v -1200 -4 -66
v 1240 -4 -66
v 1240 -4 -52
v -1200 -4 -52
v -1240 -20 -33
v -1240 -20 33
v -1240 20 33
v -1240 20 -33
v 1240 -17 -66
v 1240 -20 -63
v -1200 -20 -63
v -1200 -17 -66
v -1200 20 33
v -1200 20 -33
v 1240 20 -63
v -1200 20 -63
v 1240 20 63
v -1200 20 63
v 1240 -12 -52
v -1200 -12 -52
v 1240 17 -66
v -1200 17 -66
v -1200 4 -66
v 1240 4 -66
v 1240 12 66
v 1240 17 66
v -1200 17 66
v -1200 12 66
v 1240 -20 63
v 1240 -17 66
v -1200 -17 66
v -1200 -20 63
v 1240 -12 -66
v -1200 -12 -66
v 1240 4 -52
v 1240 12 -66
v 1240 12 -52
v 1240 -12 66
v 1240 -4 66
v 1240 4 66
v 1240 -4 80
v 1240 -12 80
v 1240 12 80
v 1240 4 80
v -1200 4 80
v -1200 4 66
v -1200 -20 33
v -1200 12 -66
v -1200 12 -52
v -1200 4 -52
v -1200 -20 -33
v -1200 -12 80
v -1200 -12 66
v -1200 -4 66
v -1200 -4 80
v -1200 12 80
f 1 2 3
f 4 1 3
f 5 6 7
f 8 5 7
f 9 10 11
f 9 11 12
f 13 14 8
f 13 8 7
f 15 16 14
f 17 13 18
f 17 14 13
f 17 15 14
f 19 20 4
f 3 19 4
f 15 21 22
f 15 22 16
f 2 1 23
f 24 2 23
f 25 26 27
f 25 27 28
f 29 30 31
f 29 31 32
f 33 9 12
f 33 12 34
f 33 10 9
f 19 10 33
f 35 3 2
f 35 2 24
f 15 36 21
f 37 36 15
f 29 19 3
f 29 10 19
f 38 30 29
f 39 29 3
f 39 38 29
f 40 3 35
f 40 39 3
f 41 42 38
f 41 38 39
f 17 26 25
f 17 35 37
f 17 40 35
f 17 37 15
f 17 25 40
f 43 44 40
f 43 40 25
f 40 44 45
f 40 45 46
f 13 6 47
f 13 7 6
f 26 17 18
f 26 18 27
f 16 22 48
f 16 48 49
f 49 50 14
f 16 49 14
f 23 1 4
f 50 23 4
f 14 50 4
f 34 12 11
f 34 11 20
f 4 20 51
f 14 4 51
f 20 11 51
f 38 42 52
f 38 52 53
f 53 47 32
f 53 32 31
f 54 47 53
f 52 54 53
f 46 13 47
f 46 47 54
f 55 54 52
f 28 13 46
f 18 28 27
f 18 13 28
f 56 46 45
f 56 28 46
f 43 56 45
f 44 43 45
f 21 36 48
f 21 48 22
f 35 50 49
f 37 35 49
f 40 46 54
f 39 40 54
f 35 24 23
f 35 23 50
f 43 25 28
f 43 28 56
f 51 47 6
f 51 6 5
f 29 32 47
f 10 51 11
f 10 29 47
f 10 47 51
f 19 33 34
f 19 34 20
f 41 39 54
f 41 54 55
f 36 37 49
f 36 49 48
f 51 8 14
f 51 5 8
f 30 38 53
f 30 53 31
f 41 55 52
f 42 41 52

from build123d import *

# Parameters (mm, degrees)
F1_W     = 40
F1_H     = 33
F1_W_2   = 8
F1_H_2   = 14
F3_DEPTH = 1240
F2_W     = 80
F2_H     = 100
F4_DEPTH = 25


with BuildPart() as f3:
    # F1 (on Right) → F3 (new body, symmetric)
    with BuildSketch(Plane.YZ):
        Polygon((20, 33), (20, 63), (17, 66), (12, 66), (12, 80), (4, 80), (4, 66), (-4, 66), (-4, 80), (-12, 80), (-12, 66), (-17, 66), (-20, 63), (-20, 33), align=None)
        with Locations((0, 16.5)):
            Rectangle(F1_W, F1_H)
        with Locations((0, -16.5)):
            Rectangle(F1_W, F1_H)
        Polygon((20, -52), (20, -33), (-20, -33), (-20, -52), (-12, -52), (-4, -52), (4, -52), (12, -52), align=None)
        Polygon((-12, -52), (-20, -52), (-20, -63), (-17, -66), (-12, -66), align=None)
        with Locations((0, -59)):
            Rectangle(F1_W_2, F1_H_2)
        Polygon((20, -63), (20, -52), (12, -52), (12, -66), (17, -66), align=None)
    extrude(amount=F3_DEPTH, both=True)

    # F2 (on Front) → F4 (cut, symmetric)
    with BuildSketch(Plane.XZ):
        with Locations((-1240, 83)):
            Rectangle(F2_W, F2_H)
        with Locations((-1240, -83)):
            Rectangle(F2_W, F2_H)
    extrude(amount=F4_DEPTH, both=True, mode=Mode.SUBTRACT)


solid = f3.part
